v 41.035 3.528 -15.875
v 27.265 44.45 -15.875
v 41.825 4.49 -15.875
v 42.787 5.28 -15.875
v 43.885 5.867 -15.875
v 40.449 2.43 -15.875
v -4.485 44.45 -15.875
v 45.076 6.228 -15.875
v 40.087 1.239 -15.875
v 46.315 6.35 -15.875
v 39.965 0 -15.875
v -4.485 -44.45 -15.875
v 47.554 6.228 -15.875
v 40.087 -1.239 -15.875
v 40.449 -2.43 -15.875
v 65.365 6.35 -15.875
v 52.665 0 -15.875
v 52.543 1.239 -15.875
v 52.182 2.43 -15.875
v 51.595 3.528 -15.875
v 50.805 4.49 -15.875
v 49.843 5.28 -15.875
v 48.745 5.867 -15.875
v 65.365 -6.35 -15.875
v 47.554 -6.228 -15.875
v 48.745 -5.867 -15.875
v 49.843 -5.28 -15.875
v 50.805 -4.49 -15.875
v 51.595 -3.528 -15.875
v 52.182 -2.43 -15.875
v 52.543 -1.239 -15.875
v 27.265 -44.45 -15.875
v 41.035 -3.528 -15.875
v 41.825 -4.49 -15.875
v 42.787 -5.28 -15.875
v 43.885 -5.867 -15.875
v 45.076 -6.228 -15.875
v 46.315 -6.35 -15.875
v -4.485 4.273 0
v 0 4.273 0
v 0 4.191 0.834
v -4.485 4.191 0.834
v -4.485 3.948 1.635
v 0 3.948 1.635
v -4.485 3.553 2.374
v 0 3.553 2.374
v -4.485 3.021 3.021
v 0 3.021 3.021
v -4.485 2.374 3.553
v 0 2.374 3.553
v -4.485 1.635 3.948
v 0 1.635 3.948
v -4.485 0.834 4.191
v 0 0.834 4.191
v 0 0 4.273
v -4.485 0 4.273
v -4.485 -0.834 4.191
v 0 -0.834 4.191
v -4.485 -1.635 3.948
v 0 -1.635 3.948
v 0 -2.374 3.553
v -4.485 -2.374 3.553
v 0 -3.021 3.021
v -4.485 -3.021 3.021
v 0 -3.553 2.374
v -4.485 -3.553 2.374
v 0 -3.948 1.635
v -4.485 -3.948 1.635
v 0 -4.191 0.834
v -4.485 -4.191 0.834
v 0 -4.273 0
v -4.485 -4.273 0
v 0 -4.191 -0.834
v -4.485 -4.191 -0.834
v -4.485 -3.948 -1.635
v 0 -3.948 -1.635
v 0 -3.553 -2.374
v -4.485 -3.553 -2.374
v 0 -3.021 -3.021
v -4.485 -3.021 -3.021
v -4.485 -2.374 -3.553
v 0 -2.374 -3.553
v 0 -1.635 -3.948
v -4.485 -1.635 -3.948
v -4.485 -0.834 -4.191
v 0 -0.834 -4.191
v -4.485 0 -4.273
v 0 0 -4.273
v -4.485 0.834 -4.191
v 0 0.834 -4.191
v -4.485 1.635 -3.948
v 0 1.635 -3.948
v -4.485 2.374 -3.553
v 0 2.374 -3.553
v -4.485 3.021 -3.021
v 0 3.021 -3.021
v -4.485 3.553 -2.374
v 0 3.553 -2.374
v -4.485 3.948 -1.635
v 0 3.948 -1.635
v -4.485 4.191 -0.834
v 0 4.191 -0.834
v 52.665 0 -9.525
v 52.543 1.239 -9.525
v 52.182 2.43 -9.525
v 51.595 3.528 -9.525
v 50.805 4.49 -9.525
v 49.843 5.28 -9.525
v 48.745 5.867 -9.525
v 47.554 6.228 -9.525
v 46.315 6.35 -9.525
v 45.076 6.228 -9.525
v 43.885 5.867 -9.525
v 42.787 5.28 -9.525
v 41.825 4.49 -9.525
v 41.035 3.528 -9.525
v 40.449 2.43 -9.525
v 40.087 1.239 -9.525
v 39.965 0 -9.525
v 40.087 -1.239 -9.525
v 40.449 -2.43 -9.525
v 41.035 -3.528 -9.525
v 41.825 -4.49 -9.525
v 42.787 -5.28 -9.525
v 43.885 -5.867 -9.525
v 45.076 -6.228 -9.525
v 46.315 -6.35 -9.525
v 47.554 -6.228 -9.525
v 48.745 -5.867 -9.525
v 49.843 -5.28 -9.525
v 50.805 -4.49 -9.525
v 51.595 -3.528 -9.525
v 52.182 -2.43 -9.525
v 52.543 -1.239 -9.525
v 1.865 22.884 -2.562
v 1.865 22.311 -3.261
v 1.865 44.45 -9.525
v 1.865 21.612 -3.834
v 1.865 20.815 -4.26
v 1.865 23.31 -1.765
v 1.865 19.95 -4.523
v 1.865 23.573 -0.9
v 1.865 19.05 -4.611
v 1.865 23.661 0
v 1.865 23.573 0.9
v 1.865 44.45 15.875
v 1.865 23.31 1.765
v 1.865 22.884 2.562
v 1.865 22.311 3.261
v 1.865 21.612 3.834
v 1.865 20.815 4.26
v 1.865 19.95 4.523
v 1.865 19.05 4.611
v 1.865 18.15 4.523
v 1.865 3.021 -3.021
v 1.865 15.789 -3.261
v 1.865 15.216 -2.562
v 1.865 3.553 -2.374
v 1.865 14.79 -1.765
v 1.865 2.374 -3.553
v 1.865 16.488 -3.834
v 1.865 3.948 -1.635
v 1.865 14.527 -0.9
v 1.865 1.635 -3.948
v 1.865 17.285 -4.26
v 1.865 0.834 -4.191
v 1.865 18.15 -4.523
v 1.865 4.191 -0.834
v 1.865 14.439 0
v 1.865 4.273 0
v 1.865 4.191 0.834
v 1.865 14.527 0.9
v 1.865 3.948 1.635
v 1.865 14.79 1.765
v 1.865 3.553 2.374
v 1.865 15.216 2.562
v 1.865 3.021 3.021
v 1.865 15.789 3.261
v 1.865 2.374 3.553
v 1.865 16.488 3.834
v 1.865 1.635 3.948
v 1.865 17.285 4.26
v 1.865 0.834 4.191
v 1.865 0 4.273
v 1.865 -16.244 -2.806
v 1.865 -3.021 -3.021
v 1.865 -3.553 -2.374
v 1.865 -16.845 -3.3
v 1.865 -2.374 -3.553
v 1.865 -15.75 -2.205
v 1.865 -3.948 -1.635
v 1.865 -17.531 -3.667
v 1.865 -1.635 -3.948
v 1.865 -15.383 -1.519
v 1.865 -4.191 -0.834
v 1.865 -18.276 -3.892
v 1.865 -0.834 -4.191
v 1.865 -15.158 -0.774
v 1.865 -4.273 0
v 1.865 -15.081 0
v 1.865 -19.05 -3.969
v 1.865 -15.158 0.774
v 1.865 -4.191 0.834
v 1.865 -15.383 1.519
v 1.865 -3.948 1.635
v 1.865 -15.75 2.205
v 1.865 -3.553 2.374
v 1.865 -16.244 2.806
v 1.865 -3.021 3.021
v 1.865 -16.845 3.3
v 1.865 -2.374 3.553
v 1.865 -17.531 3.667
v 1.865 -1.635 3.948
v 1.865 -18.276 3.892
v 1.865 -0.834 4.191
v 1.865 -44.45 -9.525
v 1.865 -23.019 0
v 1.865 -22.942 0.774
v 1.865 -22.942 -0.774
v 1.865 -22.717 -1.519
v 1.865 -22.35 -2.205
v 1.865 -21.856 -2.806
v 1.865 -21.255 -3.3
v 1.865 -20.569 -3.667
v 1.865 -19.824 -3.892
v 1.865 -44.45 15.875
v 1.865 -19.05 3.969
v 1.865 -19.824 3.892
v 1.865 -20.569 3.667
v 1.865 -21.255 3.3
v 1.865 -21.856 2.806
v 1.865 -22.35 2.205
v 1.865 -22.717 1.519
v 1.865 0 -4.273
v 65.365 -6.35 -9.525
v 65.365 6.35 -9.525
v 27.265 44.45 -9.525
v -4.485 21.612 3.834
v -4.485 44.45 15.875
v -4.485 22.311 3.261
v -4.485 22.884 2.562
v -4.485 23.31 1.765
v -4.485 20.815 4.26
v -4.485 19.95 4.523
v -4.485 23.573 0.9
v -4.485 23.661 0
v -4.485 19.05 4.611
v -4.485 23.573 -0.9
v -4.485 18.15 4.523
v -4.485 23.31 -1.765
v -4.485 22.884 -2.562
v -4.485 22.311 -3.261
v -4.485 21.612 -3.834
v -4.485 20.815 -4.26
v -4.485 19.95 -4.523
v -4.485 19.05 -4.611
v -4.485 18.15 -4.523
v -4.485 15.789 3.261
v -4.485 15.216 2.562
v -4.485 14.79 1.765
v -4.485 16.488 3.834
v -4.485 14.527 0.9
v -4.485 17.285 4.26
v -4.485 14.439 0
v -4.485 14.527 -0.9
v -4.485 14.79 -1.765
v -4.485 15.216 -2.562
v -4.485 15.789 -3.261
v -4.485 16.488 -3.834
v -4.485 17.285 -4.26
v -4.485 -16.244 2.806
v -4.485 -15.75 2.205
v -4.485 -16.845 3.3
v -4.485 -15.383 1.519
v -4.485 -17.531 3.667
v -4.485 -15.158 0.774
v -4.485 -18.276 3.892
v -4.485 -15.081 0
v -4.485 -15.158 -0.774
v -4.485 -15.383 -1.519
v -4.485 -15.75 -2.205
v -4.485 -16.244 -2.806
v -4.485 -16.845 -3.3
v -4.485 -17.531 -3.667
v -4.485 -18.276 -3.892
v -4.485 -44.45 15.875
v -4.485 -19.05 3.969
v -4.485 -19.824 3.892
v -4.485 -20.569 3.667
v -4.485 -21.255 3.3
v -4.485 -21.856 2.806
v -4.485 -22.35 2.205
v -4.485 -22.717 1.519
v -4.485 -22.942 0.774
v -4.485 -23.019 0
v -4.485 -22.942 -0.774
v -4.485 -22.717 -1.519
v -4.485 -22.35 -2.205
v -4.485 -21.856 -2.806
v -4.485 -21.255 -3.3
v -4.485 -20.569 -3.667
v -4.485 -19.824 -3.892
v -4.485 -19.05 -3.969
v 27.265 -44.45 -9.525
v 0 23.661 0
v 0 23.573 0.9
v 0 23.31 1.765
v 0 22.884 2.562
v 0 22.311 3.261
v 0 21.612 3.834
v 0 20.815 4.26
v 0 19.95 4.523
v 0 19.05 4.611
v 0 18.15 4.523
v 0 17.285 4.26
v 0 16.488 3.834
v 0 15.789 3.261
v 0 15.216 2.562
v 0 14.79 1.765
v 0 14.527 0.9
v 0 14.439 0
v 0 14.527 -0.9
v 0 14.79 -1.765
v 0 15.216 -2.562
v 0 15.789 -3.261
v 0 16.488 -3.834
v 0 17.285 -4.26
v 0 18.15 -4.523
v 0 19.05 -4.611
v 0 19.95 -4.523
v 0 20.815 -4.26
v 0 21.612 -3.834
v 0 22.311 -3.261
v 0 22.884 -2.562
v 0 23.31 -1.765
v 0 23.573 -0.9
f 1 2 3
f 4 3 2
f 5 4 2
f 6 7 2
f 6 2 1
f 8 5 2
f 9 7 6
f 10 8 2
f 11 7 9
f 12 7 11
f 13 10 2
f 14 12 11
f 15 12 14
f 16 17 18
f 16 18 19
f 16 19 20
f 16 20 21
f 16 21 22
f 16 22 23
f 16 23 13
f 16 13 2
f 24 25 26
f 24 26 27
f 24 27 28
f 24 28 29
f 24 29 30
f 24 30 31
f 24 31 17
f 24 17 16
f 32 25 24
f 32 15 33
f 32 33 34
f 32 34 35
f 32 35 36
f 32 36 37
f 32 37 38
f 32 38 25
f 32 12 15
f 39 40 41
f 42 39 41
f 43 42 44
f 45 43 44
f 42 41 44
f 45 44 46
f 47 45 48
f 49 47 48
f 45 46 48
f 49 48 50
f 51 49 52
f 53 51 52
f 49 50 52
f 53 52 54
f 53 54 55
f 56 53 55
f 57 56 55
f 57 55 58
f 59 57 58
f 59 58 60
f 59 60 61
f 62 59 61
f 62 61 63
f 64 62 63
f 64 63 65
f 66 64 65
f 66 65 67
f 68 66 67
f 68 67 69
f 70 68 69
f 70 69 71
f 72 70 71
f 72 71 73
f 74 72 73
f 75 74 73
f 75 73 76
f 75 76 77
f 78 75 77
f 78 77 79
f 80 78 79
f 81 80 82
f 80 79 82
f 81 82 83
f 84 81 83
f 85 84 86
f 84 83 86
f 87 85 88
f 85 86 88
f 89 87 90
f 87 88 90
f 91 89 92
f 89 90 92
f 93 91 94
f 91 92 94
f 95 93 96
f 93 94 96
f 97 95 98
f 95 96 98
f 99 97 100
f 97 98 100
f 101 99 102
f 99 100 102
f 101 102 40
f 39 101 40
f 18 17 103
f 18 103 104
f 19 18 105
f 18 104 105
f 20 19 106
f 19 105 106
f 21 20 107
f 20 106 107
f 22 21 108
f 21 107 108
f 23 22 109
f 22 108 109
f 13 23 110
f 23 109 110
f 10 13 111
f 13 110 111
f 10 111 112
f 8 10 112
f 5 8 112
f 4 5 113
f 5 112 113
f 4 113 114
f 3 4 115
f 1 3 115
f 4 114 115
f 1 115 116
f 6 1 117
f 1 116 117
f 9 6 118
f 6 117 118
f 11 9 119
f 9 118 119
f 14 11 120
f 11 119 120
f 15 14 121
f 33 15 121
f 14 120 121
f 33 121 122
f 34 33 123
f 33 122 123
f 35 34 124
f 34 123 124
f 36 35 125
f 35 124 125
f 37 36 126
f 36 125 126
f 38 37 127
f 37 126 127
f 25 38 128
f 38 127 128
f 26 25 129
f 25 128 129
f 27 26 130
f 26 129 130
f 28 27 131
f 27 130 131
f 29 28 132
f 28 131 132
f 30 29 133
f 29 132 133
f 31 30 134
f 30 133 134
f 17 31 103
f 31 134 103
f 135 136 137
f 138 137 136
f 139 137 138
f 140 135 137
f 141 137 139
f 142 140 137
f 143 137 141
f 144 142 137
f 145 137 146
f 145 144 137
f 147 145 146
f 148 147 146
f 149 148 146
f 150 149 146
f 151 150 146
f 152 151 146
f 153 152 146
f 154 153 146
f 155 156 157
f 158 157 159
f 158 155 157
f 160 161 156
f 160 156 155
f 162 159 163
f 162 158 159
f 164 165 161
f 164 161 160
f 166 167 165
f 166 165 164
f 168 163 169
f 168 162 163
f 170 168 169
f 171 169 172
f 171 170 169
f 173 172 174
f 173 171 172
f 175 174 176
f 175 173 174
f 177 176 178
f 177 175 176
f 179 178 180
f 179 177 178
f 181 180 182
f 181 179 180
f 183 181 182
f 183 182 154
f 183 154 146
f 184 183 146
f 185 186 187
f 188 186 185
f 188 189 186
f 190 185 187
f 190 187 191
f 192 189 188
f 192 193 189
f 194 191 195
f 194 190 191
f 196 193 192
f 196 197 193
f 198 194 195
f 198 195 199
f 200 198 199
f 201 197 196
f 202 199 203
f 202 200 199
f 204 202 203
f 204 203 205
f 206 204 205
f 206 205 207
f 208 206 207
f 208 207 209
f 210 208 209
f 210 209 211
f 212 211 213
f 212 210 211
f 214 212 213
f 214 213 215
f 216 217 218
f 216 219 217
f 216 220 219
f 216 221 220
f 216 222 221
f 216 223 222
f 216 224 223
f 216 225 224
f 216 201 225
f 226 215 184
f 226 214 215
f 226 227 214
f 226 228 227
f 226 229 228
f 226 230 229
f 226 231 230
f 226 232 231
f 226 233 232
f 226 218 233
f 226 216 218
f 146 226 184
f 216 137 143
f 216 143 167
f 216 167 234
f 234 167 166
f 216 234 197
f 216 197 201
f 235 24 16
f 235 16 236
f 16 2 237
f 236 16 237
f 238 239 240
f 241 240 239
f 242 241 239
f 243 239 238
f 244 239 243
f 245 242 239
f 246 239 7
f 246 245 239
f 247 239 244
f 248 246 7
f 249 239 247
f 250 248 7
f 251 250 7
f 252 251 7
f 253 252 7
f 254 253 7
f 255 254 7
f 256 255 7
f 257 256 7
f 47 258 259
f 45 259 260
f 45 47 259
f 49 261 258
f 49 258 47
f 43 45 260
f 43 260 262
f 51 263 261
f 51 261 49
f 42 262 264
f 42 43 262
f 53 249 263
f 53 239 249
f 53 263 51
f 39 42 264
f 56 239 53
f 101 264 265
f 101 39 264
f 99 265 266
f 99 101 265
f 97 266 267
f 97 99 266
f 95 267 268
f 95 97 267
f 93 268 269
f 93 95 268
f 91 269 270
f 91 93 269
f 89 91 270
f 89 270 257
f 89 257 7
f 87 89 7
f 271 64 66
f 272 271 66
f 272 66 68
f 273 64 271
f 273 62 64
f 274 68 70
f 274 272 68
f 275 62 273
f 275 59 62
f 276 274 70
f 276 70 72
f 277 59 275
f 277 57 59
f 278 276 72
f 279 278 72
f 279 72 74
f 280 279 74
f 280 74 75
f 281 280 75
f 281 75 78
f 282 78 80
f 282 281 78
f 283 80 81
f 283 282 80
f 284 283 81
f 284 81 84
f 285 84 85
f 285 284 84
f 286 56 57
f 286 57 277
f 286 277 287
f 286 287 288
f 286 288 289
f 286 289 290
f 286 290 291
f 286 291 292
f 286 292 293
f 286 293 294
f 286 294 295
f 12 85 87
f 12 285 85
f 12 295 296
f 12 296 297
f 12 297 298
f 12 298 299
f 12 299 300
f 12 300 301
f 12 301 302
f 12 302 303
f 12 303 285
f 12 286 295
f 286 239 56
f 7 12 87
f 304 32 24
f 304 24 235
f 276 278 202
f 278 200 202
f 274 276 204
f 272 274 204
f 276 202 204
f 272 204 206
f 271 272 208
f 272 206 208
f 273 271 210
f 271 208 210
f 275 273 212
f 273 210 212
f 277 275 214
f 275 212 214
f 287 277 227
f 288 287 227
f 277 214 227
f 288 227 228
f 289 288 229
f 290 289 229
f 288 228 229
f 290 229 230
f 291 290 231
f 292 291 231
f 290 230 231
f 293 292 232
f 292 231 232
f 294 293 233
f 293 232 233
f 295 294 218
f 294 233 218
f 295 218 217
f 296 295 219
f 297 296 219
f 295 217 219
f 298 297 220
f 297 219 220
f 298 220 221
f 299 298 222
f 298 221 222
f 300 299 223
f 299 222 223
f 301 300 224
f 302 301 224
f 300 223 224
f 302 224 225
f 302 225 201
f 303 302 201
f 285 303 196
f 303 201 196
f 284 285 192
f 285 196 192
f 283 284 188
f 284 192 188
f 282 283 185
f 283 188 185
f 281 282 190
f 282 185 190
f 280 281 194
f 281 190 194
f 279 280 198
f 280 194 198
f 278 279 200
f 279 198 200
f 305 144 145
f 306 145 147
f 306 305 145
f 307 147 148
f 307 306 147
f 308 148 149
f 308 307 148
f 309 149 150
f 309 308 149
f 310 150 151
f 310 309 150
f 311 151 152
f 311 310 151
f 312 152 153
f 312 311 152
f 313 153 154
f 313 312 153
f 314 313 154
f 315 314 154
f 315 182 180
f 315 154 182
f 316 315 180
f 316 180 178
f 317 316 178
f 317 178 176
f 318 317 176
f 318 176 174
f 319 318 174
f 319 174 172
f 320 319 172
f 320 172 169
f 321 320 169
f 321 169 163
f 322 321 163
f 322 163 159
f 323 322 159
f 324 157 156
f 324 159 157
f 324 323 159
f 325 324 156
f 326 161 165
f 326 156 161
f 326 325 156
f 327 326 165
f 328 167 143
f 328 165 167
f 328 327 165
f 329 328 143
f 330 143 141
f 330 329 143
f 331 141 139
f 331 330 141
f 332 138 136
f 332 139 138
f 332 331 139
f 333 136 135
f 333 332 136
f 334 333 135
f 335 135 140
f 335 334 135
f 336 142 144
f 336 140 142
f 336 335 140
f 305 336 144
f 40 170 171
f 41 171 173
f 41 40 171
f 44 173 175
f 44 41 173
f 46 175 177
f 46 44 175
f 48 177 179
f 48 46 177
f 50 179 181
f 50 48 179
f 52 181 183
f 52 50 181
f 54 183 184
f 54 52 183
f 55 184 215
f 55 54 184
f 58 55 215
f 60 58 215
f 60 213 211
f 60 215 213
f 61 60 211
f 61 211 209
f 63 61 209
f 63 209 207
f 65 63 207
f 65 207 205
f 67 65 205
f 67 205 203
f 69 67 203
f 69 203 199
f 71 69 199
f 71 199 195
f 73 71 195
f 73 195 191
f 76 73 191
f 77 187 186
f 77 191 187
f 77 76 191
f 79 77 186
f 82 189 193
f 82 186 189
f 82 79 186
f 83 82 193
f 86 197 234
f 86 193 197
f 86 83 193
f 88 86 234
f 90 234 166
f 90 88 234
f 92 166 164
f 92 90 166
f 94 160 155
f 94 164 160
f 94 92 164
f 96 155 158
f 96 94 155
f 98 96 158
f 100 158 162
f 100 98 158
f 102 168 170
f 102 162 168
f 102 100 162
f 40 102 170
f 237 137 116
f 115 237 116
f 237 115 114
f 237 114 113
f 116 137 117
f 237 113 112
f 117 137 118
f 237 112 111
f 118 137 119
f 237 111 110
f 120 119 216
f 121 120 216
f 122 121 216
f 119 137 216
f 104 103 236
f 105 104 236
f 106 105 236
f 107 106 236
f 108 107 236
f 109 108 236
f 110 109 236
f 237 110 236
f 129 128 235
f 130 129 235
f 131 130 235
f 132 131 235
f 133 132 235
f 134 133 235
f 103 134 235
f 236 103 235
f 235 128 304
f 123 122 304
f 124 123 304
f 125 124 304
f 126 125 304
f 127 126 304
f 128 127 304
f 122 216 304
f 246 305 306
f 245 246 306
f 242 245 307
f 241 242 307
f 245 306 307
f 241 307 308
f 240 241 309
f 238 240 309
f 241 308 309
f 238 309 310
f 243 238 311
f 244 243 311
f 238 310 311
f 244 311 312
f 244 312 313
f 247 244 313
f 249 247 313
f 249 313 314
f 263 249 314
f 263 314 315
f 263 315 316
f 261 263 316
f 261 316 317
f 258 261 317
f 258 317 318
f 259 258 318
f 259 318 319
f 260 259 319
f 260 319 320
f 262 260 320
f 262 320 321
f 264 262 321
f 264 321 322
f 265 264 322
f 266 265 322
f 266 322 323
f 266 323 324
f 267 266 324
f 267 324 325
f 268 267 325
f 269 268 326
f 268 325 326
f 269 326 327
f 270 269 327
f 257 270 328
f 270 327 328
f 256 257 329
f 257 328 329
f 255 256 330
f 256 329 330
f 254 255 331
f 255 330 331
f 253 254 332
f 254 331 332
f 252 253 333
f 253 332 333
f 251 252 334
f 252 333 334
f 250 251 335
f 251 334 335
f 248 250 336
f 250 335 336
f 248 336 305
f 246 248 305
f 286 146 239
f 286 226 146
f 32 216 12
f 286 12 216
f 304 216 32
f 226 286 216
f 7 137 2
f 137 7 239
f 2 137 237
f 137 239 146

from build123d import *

# Parameters (mm, degrees)
F0_W     = 63.5
F0_H     = 6.35
F1_DEPTH = 44.45
F2_SIZE  = 38.1
F3_SIZE  = 38.1
F4_R     = 4.2729711543
F4_R_2   = 4.6114221179
F4_R_3   = 3.96875
F5_DEPTH = 127
F6_R     = 6.35
F7_DEPTH = 127


with BuildPart() as f1:
    # F0 (on Front) → F1 (new body, symmetric)
    with BuildSketch(Plane.XZ):
        Polygon((1.8653165565, 15.875), (-4.4846834435, 15.875), (-4.4846834435, -15.875), (1.8653165565, -15.875), (1.8653165565, -9.525), align=None)
        with Locations((33.6153165565, -12.7)):
            Rectangle(F0_W, F0_H)
    extrude(amount=F1_DEPTH, both=True)

    # F2
    f2_edges = [f1.edges().sort_by_distance(p)[0] for p in [
        (65.365317, 44.45, -12.7),
    ]]
    chamfer(f2_edges, length=F2_SIZE)

    # F3
    f3_edges = [f1.edges().sort_by_distance(p)[0] for p in [
        (65.365317, -44.45, -12.7),
    ]]
    chamfer(f3_edges, length=F3_SIZE)

    # F4 (on Right) → F5 (cut, symmetric)
    with BuildSketch(Plane.YZ):
        Circle(F4_R)
        with Locations((19.05, 0)):
            Circle(F4_R_2)
        with Locations((-19.05, 0)):
            Circle(F4_R_3)
    extrude(amount=F5_DEPTH, both=True, mode=Mode.SUBTRACT)

    # F6 (on Top) → F7 (cut, symmetric)
    with BuildSketch(Plane.XY):
        with Locations((46.3153165565, 0)):
            Circle(F6_R)
    extrude(amount=F7_DEPTH, both=True, mode=Mode.SUBTRACT)


solid = f1.part
